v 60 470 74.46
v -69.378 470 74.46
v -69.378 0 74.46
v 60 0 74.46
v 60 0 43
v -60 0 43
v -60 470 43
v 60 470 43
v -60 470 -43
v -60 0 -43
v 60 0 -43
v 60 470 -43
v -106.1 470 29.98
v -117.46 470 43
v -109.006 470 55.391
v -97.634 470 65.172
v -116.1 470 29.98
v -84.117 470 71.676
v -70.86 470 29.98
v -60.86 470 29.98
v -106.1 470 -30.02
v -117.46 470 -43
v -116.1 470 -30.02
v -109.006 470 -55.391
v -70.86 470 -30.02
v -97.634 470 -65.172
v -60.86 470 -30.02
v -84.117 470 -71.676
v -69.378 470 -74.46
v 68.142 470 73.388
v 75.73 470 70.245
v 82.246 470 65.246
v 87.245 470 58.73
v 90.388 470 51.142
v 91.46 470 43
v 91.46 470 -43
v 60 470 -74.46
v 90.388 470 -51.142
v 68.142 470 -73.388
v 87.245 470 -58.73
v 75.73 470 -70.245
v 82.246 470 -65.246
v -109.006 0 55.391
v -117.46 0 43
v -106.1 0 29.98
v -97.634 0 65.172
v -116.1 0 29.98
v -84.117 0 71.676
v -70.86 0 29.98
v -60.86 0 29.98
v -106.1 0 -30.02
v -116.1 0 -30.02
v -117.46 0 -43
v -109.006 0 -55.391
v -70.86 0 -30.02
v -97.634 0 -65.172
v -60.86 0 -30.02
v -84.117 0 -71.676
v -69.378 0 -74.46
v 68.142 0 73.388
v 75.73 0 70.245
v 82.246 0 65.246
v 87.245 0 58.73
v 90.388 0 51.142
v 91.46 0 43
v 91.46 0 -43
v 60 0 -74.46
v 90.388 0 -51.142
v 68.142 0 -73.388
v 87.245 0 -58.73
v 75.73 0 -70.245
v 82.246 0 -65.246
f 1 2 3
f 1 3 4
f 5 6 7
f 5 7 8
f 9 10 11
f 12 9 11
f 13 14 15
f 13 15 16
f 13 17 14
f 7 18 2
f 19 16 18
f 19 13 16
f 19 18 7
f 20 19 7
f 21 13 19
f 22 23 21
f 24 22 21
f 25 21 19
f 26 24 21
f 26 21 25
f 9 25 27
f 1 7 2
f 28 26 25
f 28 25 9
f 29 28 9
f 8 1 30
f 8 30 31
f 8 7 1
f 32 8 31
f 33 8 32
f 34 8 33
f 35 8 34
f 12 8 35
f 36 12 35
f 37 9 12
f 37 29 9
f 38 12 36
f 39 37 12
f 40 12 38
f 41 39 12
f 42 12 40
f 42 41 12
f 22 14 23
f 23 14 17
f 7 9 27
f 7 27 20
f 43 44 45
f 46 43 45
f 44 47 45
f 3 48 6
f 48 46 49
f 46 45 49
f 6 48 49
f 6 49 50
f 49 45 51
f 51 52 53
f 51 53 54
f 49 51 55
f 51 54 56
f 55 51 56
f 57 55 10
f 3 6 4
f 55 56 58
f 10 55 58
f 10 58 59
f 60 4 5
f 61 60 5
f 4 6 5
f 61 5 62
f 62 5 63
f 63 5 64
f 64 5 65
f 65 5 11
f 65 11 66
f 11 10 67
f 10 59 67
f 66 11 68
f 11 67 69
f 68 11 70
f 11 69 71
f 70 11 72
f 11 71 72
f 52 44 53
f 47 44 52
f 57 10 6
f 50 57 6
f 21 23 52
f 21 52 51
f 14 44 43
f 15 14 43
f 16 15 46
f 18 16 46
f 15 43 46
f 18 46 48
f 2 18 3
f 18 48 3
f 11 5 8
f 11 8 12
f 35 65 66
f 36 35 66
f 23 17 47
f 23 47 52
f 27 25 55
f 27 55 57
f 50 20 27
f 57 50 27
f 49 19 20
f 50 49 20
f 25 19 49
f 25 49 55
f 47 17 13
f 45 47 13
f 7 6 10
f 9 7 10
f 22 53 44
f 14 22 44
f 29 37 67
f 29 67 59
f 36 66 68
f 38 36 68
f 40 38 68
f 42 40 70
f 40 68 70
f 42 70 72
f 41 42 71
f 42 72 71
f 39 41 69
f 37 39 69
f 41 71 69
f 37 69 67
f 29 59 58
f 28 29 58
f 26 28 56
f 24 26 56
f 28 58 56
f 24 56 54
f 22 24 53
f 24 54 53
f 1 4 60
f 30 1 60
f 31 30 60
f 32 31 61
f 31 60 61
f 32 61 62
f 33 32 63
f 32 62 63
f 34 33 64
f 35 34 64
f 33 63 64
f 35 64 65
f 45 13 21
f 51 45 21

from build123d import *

# Parameters (mm, degrees)
SKETCH1_W           = 120
SKETCH1_H           = 86
SKETCH1_W_2         = 10
SKETCH1_H_2         = 60
BOSS_EXTRUDE1_DEPTH = 470


with BuildPart() as part:
    # Sketch1 → Boss-Extrude1 (new body)
    with BuildSketch(Plane(origin=(0, 0, 0), x_dir=(1, 0, 0), z_dir=(0, 1, 0))):
        with BuildLine():
            Line((60, 74.46), (-69.377570777, 74.46))
            ThreePointArc((-69.377570777, 74.46), (-97.633626185, 65.17182404), (-117.46, 43))
            Line((-117.46, 43), (-117.46, -43))
            ThreePointArc((-117.46, -43), (-97.633626185, -65.17182404), (-69.377570777, -74.46))
            Line((-69.377570777, -74.46), (60, -74.46))
            ThreePointArc((60, -74.46), (82.245579336, -65.245579336), (91.46, -43))
            Line((91.46, -43), (91.46, 43))
            ThreePointArc((91.46, 43), (82.245579336, 65.245579336), (60, 74.46))
        make_face()
        Rectangle(SKETCH1_W, SKETCH1_H, mode=Mode.SUBTRACT)
        with Locations((-65.86, 0.020423388)):
            Rectangle(SKETCH1_W_2, SKETCH1_H_2, mode=Mode.SUBTRACT)
        with Locations((-111.1, 0.020423388)):
            Rectangle(SKETCH1_W_2, SKETCH1_H_2, mode=Mode.SUBTRACT)
    extrude(amount=BOSS_EXTRUDE1_DEPTH)


solid = part.part
